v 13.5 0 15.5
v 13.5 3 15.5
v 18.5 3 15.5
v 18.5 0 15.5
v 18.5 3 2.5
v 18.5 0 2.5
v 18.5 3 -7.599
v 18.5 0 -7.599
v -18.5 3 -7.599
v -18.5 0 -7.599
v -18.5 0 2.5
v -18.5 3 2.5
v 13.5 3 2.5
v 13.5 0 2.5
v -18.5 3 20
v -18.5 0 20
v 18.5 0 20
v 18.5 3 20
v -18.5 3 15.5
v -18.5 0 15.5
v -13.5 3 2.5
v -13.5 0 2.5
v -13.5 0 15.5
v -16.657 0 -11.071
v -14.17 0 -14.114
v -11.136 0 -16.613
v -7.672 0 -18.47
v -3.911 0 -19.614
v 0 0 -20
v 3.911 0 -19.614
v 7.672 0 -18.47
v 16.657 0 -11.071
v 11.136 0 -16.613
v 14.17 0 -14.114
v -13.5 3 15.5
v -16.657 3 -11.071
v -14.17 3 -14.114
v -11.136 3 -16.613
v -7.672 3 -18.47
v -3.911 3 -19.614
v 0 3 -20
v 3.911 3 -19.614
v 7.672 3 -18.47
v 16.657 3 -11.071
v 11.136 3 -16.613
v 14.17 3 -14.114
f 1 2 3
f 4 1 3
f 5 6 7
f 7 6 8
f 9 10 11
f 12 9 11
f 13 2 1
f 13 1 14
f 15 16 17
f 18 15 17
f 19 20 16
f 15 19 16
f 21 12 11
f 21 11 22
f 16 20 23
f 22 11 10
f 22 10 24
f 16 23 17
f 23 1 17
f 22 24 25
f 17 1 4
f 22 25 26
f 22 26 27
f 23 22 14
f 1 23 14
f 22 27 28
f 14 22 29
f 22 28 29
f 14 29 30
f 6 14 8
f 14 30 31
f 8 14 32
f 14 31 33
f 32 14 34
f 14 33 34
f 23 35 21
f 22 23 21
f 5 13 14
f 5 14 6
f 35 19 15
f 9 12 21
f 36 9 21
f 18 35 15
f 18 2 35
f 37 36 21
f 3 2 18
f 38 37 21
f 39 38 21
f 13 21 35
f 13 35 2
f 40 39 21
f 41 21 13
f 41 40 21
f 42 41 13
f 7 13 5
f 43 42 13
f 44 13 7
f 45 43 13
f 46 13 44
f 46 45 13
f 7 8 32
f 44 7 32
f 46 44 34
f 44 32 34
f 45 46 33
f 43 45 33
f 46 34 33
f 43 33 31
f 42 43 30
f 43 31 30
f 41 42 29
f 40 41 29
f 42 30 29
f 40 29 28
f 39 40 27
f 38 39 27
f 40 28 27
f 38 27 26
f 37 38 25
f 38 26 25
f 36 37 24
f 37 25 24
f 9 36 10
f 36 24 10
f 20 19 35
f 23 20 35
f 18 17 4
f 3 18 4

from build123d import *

# Parameters (mm, degrees)
BOSS_EXTRUDE1_DEPTH = 3
SKETCH2_W           = 5
SKETCH2_H           = 13
CUT_EXTRUDE2_DEPTH  = 10


with BuildPart() as part:
    # Sketch1 → Boss-Extrude1 (new body)
    with BuildSketch(Plane(origin=(0, 0, 0), x_dir=(1, 0, 0), z_dir=(0, 1, 0))):
        with BuildLine():
            ThreePointArc((18.5, 7.599342077), (0, 20), (-18.5, 7.599342077))
            Line((-18.5, 7.599342077), (-18.5, -20))
            Line((-18.5, -20), (18.5, -20))
            Line((18.5, -20), (18.5, 7.599342077))
        make_face()
    extrude(amount=BOSS_EXTRUDE1_DEPTH)

    # Sketch2 → Cut-Extrude2 (cut)
    with BuildSketch(Plane(origin=(0, 3, 0), x_dir=(1, 0, 0), z_dir=(0, 1, 0))):
        with Locations((-16, -9)):
            Rectangle(SKETCH2_W, SKETCH2_H)
        with Locations((16, -9)):
            Rectangle(SKETCH2_W, SKETCH2_H)
    extrude(amount=-CUT_EXTRUDE2_DEPTH, mode=Mode.SUBTRACT)


solid = part.part
